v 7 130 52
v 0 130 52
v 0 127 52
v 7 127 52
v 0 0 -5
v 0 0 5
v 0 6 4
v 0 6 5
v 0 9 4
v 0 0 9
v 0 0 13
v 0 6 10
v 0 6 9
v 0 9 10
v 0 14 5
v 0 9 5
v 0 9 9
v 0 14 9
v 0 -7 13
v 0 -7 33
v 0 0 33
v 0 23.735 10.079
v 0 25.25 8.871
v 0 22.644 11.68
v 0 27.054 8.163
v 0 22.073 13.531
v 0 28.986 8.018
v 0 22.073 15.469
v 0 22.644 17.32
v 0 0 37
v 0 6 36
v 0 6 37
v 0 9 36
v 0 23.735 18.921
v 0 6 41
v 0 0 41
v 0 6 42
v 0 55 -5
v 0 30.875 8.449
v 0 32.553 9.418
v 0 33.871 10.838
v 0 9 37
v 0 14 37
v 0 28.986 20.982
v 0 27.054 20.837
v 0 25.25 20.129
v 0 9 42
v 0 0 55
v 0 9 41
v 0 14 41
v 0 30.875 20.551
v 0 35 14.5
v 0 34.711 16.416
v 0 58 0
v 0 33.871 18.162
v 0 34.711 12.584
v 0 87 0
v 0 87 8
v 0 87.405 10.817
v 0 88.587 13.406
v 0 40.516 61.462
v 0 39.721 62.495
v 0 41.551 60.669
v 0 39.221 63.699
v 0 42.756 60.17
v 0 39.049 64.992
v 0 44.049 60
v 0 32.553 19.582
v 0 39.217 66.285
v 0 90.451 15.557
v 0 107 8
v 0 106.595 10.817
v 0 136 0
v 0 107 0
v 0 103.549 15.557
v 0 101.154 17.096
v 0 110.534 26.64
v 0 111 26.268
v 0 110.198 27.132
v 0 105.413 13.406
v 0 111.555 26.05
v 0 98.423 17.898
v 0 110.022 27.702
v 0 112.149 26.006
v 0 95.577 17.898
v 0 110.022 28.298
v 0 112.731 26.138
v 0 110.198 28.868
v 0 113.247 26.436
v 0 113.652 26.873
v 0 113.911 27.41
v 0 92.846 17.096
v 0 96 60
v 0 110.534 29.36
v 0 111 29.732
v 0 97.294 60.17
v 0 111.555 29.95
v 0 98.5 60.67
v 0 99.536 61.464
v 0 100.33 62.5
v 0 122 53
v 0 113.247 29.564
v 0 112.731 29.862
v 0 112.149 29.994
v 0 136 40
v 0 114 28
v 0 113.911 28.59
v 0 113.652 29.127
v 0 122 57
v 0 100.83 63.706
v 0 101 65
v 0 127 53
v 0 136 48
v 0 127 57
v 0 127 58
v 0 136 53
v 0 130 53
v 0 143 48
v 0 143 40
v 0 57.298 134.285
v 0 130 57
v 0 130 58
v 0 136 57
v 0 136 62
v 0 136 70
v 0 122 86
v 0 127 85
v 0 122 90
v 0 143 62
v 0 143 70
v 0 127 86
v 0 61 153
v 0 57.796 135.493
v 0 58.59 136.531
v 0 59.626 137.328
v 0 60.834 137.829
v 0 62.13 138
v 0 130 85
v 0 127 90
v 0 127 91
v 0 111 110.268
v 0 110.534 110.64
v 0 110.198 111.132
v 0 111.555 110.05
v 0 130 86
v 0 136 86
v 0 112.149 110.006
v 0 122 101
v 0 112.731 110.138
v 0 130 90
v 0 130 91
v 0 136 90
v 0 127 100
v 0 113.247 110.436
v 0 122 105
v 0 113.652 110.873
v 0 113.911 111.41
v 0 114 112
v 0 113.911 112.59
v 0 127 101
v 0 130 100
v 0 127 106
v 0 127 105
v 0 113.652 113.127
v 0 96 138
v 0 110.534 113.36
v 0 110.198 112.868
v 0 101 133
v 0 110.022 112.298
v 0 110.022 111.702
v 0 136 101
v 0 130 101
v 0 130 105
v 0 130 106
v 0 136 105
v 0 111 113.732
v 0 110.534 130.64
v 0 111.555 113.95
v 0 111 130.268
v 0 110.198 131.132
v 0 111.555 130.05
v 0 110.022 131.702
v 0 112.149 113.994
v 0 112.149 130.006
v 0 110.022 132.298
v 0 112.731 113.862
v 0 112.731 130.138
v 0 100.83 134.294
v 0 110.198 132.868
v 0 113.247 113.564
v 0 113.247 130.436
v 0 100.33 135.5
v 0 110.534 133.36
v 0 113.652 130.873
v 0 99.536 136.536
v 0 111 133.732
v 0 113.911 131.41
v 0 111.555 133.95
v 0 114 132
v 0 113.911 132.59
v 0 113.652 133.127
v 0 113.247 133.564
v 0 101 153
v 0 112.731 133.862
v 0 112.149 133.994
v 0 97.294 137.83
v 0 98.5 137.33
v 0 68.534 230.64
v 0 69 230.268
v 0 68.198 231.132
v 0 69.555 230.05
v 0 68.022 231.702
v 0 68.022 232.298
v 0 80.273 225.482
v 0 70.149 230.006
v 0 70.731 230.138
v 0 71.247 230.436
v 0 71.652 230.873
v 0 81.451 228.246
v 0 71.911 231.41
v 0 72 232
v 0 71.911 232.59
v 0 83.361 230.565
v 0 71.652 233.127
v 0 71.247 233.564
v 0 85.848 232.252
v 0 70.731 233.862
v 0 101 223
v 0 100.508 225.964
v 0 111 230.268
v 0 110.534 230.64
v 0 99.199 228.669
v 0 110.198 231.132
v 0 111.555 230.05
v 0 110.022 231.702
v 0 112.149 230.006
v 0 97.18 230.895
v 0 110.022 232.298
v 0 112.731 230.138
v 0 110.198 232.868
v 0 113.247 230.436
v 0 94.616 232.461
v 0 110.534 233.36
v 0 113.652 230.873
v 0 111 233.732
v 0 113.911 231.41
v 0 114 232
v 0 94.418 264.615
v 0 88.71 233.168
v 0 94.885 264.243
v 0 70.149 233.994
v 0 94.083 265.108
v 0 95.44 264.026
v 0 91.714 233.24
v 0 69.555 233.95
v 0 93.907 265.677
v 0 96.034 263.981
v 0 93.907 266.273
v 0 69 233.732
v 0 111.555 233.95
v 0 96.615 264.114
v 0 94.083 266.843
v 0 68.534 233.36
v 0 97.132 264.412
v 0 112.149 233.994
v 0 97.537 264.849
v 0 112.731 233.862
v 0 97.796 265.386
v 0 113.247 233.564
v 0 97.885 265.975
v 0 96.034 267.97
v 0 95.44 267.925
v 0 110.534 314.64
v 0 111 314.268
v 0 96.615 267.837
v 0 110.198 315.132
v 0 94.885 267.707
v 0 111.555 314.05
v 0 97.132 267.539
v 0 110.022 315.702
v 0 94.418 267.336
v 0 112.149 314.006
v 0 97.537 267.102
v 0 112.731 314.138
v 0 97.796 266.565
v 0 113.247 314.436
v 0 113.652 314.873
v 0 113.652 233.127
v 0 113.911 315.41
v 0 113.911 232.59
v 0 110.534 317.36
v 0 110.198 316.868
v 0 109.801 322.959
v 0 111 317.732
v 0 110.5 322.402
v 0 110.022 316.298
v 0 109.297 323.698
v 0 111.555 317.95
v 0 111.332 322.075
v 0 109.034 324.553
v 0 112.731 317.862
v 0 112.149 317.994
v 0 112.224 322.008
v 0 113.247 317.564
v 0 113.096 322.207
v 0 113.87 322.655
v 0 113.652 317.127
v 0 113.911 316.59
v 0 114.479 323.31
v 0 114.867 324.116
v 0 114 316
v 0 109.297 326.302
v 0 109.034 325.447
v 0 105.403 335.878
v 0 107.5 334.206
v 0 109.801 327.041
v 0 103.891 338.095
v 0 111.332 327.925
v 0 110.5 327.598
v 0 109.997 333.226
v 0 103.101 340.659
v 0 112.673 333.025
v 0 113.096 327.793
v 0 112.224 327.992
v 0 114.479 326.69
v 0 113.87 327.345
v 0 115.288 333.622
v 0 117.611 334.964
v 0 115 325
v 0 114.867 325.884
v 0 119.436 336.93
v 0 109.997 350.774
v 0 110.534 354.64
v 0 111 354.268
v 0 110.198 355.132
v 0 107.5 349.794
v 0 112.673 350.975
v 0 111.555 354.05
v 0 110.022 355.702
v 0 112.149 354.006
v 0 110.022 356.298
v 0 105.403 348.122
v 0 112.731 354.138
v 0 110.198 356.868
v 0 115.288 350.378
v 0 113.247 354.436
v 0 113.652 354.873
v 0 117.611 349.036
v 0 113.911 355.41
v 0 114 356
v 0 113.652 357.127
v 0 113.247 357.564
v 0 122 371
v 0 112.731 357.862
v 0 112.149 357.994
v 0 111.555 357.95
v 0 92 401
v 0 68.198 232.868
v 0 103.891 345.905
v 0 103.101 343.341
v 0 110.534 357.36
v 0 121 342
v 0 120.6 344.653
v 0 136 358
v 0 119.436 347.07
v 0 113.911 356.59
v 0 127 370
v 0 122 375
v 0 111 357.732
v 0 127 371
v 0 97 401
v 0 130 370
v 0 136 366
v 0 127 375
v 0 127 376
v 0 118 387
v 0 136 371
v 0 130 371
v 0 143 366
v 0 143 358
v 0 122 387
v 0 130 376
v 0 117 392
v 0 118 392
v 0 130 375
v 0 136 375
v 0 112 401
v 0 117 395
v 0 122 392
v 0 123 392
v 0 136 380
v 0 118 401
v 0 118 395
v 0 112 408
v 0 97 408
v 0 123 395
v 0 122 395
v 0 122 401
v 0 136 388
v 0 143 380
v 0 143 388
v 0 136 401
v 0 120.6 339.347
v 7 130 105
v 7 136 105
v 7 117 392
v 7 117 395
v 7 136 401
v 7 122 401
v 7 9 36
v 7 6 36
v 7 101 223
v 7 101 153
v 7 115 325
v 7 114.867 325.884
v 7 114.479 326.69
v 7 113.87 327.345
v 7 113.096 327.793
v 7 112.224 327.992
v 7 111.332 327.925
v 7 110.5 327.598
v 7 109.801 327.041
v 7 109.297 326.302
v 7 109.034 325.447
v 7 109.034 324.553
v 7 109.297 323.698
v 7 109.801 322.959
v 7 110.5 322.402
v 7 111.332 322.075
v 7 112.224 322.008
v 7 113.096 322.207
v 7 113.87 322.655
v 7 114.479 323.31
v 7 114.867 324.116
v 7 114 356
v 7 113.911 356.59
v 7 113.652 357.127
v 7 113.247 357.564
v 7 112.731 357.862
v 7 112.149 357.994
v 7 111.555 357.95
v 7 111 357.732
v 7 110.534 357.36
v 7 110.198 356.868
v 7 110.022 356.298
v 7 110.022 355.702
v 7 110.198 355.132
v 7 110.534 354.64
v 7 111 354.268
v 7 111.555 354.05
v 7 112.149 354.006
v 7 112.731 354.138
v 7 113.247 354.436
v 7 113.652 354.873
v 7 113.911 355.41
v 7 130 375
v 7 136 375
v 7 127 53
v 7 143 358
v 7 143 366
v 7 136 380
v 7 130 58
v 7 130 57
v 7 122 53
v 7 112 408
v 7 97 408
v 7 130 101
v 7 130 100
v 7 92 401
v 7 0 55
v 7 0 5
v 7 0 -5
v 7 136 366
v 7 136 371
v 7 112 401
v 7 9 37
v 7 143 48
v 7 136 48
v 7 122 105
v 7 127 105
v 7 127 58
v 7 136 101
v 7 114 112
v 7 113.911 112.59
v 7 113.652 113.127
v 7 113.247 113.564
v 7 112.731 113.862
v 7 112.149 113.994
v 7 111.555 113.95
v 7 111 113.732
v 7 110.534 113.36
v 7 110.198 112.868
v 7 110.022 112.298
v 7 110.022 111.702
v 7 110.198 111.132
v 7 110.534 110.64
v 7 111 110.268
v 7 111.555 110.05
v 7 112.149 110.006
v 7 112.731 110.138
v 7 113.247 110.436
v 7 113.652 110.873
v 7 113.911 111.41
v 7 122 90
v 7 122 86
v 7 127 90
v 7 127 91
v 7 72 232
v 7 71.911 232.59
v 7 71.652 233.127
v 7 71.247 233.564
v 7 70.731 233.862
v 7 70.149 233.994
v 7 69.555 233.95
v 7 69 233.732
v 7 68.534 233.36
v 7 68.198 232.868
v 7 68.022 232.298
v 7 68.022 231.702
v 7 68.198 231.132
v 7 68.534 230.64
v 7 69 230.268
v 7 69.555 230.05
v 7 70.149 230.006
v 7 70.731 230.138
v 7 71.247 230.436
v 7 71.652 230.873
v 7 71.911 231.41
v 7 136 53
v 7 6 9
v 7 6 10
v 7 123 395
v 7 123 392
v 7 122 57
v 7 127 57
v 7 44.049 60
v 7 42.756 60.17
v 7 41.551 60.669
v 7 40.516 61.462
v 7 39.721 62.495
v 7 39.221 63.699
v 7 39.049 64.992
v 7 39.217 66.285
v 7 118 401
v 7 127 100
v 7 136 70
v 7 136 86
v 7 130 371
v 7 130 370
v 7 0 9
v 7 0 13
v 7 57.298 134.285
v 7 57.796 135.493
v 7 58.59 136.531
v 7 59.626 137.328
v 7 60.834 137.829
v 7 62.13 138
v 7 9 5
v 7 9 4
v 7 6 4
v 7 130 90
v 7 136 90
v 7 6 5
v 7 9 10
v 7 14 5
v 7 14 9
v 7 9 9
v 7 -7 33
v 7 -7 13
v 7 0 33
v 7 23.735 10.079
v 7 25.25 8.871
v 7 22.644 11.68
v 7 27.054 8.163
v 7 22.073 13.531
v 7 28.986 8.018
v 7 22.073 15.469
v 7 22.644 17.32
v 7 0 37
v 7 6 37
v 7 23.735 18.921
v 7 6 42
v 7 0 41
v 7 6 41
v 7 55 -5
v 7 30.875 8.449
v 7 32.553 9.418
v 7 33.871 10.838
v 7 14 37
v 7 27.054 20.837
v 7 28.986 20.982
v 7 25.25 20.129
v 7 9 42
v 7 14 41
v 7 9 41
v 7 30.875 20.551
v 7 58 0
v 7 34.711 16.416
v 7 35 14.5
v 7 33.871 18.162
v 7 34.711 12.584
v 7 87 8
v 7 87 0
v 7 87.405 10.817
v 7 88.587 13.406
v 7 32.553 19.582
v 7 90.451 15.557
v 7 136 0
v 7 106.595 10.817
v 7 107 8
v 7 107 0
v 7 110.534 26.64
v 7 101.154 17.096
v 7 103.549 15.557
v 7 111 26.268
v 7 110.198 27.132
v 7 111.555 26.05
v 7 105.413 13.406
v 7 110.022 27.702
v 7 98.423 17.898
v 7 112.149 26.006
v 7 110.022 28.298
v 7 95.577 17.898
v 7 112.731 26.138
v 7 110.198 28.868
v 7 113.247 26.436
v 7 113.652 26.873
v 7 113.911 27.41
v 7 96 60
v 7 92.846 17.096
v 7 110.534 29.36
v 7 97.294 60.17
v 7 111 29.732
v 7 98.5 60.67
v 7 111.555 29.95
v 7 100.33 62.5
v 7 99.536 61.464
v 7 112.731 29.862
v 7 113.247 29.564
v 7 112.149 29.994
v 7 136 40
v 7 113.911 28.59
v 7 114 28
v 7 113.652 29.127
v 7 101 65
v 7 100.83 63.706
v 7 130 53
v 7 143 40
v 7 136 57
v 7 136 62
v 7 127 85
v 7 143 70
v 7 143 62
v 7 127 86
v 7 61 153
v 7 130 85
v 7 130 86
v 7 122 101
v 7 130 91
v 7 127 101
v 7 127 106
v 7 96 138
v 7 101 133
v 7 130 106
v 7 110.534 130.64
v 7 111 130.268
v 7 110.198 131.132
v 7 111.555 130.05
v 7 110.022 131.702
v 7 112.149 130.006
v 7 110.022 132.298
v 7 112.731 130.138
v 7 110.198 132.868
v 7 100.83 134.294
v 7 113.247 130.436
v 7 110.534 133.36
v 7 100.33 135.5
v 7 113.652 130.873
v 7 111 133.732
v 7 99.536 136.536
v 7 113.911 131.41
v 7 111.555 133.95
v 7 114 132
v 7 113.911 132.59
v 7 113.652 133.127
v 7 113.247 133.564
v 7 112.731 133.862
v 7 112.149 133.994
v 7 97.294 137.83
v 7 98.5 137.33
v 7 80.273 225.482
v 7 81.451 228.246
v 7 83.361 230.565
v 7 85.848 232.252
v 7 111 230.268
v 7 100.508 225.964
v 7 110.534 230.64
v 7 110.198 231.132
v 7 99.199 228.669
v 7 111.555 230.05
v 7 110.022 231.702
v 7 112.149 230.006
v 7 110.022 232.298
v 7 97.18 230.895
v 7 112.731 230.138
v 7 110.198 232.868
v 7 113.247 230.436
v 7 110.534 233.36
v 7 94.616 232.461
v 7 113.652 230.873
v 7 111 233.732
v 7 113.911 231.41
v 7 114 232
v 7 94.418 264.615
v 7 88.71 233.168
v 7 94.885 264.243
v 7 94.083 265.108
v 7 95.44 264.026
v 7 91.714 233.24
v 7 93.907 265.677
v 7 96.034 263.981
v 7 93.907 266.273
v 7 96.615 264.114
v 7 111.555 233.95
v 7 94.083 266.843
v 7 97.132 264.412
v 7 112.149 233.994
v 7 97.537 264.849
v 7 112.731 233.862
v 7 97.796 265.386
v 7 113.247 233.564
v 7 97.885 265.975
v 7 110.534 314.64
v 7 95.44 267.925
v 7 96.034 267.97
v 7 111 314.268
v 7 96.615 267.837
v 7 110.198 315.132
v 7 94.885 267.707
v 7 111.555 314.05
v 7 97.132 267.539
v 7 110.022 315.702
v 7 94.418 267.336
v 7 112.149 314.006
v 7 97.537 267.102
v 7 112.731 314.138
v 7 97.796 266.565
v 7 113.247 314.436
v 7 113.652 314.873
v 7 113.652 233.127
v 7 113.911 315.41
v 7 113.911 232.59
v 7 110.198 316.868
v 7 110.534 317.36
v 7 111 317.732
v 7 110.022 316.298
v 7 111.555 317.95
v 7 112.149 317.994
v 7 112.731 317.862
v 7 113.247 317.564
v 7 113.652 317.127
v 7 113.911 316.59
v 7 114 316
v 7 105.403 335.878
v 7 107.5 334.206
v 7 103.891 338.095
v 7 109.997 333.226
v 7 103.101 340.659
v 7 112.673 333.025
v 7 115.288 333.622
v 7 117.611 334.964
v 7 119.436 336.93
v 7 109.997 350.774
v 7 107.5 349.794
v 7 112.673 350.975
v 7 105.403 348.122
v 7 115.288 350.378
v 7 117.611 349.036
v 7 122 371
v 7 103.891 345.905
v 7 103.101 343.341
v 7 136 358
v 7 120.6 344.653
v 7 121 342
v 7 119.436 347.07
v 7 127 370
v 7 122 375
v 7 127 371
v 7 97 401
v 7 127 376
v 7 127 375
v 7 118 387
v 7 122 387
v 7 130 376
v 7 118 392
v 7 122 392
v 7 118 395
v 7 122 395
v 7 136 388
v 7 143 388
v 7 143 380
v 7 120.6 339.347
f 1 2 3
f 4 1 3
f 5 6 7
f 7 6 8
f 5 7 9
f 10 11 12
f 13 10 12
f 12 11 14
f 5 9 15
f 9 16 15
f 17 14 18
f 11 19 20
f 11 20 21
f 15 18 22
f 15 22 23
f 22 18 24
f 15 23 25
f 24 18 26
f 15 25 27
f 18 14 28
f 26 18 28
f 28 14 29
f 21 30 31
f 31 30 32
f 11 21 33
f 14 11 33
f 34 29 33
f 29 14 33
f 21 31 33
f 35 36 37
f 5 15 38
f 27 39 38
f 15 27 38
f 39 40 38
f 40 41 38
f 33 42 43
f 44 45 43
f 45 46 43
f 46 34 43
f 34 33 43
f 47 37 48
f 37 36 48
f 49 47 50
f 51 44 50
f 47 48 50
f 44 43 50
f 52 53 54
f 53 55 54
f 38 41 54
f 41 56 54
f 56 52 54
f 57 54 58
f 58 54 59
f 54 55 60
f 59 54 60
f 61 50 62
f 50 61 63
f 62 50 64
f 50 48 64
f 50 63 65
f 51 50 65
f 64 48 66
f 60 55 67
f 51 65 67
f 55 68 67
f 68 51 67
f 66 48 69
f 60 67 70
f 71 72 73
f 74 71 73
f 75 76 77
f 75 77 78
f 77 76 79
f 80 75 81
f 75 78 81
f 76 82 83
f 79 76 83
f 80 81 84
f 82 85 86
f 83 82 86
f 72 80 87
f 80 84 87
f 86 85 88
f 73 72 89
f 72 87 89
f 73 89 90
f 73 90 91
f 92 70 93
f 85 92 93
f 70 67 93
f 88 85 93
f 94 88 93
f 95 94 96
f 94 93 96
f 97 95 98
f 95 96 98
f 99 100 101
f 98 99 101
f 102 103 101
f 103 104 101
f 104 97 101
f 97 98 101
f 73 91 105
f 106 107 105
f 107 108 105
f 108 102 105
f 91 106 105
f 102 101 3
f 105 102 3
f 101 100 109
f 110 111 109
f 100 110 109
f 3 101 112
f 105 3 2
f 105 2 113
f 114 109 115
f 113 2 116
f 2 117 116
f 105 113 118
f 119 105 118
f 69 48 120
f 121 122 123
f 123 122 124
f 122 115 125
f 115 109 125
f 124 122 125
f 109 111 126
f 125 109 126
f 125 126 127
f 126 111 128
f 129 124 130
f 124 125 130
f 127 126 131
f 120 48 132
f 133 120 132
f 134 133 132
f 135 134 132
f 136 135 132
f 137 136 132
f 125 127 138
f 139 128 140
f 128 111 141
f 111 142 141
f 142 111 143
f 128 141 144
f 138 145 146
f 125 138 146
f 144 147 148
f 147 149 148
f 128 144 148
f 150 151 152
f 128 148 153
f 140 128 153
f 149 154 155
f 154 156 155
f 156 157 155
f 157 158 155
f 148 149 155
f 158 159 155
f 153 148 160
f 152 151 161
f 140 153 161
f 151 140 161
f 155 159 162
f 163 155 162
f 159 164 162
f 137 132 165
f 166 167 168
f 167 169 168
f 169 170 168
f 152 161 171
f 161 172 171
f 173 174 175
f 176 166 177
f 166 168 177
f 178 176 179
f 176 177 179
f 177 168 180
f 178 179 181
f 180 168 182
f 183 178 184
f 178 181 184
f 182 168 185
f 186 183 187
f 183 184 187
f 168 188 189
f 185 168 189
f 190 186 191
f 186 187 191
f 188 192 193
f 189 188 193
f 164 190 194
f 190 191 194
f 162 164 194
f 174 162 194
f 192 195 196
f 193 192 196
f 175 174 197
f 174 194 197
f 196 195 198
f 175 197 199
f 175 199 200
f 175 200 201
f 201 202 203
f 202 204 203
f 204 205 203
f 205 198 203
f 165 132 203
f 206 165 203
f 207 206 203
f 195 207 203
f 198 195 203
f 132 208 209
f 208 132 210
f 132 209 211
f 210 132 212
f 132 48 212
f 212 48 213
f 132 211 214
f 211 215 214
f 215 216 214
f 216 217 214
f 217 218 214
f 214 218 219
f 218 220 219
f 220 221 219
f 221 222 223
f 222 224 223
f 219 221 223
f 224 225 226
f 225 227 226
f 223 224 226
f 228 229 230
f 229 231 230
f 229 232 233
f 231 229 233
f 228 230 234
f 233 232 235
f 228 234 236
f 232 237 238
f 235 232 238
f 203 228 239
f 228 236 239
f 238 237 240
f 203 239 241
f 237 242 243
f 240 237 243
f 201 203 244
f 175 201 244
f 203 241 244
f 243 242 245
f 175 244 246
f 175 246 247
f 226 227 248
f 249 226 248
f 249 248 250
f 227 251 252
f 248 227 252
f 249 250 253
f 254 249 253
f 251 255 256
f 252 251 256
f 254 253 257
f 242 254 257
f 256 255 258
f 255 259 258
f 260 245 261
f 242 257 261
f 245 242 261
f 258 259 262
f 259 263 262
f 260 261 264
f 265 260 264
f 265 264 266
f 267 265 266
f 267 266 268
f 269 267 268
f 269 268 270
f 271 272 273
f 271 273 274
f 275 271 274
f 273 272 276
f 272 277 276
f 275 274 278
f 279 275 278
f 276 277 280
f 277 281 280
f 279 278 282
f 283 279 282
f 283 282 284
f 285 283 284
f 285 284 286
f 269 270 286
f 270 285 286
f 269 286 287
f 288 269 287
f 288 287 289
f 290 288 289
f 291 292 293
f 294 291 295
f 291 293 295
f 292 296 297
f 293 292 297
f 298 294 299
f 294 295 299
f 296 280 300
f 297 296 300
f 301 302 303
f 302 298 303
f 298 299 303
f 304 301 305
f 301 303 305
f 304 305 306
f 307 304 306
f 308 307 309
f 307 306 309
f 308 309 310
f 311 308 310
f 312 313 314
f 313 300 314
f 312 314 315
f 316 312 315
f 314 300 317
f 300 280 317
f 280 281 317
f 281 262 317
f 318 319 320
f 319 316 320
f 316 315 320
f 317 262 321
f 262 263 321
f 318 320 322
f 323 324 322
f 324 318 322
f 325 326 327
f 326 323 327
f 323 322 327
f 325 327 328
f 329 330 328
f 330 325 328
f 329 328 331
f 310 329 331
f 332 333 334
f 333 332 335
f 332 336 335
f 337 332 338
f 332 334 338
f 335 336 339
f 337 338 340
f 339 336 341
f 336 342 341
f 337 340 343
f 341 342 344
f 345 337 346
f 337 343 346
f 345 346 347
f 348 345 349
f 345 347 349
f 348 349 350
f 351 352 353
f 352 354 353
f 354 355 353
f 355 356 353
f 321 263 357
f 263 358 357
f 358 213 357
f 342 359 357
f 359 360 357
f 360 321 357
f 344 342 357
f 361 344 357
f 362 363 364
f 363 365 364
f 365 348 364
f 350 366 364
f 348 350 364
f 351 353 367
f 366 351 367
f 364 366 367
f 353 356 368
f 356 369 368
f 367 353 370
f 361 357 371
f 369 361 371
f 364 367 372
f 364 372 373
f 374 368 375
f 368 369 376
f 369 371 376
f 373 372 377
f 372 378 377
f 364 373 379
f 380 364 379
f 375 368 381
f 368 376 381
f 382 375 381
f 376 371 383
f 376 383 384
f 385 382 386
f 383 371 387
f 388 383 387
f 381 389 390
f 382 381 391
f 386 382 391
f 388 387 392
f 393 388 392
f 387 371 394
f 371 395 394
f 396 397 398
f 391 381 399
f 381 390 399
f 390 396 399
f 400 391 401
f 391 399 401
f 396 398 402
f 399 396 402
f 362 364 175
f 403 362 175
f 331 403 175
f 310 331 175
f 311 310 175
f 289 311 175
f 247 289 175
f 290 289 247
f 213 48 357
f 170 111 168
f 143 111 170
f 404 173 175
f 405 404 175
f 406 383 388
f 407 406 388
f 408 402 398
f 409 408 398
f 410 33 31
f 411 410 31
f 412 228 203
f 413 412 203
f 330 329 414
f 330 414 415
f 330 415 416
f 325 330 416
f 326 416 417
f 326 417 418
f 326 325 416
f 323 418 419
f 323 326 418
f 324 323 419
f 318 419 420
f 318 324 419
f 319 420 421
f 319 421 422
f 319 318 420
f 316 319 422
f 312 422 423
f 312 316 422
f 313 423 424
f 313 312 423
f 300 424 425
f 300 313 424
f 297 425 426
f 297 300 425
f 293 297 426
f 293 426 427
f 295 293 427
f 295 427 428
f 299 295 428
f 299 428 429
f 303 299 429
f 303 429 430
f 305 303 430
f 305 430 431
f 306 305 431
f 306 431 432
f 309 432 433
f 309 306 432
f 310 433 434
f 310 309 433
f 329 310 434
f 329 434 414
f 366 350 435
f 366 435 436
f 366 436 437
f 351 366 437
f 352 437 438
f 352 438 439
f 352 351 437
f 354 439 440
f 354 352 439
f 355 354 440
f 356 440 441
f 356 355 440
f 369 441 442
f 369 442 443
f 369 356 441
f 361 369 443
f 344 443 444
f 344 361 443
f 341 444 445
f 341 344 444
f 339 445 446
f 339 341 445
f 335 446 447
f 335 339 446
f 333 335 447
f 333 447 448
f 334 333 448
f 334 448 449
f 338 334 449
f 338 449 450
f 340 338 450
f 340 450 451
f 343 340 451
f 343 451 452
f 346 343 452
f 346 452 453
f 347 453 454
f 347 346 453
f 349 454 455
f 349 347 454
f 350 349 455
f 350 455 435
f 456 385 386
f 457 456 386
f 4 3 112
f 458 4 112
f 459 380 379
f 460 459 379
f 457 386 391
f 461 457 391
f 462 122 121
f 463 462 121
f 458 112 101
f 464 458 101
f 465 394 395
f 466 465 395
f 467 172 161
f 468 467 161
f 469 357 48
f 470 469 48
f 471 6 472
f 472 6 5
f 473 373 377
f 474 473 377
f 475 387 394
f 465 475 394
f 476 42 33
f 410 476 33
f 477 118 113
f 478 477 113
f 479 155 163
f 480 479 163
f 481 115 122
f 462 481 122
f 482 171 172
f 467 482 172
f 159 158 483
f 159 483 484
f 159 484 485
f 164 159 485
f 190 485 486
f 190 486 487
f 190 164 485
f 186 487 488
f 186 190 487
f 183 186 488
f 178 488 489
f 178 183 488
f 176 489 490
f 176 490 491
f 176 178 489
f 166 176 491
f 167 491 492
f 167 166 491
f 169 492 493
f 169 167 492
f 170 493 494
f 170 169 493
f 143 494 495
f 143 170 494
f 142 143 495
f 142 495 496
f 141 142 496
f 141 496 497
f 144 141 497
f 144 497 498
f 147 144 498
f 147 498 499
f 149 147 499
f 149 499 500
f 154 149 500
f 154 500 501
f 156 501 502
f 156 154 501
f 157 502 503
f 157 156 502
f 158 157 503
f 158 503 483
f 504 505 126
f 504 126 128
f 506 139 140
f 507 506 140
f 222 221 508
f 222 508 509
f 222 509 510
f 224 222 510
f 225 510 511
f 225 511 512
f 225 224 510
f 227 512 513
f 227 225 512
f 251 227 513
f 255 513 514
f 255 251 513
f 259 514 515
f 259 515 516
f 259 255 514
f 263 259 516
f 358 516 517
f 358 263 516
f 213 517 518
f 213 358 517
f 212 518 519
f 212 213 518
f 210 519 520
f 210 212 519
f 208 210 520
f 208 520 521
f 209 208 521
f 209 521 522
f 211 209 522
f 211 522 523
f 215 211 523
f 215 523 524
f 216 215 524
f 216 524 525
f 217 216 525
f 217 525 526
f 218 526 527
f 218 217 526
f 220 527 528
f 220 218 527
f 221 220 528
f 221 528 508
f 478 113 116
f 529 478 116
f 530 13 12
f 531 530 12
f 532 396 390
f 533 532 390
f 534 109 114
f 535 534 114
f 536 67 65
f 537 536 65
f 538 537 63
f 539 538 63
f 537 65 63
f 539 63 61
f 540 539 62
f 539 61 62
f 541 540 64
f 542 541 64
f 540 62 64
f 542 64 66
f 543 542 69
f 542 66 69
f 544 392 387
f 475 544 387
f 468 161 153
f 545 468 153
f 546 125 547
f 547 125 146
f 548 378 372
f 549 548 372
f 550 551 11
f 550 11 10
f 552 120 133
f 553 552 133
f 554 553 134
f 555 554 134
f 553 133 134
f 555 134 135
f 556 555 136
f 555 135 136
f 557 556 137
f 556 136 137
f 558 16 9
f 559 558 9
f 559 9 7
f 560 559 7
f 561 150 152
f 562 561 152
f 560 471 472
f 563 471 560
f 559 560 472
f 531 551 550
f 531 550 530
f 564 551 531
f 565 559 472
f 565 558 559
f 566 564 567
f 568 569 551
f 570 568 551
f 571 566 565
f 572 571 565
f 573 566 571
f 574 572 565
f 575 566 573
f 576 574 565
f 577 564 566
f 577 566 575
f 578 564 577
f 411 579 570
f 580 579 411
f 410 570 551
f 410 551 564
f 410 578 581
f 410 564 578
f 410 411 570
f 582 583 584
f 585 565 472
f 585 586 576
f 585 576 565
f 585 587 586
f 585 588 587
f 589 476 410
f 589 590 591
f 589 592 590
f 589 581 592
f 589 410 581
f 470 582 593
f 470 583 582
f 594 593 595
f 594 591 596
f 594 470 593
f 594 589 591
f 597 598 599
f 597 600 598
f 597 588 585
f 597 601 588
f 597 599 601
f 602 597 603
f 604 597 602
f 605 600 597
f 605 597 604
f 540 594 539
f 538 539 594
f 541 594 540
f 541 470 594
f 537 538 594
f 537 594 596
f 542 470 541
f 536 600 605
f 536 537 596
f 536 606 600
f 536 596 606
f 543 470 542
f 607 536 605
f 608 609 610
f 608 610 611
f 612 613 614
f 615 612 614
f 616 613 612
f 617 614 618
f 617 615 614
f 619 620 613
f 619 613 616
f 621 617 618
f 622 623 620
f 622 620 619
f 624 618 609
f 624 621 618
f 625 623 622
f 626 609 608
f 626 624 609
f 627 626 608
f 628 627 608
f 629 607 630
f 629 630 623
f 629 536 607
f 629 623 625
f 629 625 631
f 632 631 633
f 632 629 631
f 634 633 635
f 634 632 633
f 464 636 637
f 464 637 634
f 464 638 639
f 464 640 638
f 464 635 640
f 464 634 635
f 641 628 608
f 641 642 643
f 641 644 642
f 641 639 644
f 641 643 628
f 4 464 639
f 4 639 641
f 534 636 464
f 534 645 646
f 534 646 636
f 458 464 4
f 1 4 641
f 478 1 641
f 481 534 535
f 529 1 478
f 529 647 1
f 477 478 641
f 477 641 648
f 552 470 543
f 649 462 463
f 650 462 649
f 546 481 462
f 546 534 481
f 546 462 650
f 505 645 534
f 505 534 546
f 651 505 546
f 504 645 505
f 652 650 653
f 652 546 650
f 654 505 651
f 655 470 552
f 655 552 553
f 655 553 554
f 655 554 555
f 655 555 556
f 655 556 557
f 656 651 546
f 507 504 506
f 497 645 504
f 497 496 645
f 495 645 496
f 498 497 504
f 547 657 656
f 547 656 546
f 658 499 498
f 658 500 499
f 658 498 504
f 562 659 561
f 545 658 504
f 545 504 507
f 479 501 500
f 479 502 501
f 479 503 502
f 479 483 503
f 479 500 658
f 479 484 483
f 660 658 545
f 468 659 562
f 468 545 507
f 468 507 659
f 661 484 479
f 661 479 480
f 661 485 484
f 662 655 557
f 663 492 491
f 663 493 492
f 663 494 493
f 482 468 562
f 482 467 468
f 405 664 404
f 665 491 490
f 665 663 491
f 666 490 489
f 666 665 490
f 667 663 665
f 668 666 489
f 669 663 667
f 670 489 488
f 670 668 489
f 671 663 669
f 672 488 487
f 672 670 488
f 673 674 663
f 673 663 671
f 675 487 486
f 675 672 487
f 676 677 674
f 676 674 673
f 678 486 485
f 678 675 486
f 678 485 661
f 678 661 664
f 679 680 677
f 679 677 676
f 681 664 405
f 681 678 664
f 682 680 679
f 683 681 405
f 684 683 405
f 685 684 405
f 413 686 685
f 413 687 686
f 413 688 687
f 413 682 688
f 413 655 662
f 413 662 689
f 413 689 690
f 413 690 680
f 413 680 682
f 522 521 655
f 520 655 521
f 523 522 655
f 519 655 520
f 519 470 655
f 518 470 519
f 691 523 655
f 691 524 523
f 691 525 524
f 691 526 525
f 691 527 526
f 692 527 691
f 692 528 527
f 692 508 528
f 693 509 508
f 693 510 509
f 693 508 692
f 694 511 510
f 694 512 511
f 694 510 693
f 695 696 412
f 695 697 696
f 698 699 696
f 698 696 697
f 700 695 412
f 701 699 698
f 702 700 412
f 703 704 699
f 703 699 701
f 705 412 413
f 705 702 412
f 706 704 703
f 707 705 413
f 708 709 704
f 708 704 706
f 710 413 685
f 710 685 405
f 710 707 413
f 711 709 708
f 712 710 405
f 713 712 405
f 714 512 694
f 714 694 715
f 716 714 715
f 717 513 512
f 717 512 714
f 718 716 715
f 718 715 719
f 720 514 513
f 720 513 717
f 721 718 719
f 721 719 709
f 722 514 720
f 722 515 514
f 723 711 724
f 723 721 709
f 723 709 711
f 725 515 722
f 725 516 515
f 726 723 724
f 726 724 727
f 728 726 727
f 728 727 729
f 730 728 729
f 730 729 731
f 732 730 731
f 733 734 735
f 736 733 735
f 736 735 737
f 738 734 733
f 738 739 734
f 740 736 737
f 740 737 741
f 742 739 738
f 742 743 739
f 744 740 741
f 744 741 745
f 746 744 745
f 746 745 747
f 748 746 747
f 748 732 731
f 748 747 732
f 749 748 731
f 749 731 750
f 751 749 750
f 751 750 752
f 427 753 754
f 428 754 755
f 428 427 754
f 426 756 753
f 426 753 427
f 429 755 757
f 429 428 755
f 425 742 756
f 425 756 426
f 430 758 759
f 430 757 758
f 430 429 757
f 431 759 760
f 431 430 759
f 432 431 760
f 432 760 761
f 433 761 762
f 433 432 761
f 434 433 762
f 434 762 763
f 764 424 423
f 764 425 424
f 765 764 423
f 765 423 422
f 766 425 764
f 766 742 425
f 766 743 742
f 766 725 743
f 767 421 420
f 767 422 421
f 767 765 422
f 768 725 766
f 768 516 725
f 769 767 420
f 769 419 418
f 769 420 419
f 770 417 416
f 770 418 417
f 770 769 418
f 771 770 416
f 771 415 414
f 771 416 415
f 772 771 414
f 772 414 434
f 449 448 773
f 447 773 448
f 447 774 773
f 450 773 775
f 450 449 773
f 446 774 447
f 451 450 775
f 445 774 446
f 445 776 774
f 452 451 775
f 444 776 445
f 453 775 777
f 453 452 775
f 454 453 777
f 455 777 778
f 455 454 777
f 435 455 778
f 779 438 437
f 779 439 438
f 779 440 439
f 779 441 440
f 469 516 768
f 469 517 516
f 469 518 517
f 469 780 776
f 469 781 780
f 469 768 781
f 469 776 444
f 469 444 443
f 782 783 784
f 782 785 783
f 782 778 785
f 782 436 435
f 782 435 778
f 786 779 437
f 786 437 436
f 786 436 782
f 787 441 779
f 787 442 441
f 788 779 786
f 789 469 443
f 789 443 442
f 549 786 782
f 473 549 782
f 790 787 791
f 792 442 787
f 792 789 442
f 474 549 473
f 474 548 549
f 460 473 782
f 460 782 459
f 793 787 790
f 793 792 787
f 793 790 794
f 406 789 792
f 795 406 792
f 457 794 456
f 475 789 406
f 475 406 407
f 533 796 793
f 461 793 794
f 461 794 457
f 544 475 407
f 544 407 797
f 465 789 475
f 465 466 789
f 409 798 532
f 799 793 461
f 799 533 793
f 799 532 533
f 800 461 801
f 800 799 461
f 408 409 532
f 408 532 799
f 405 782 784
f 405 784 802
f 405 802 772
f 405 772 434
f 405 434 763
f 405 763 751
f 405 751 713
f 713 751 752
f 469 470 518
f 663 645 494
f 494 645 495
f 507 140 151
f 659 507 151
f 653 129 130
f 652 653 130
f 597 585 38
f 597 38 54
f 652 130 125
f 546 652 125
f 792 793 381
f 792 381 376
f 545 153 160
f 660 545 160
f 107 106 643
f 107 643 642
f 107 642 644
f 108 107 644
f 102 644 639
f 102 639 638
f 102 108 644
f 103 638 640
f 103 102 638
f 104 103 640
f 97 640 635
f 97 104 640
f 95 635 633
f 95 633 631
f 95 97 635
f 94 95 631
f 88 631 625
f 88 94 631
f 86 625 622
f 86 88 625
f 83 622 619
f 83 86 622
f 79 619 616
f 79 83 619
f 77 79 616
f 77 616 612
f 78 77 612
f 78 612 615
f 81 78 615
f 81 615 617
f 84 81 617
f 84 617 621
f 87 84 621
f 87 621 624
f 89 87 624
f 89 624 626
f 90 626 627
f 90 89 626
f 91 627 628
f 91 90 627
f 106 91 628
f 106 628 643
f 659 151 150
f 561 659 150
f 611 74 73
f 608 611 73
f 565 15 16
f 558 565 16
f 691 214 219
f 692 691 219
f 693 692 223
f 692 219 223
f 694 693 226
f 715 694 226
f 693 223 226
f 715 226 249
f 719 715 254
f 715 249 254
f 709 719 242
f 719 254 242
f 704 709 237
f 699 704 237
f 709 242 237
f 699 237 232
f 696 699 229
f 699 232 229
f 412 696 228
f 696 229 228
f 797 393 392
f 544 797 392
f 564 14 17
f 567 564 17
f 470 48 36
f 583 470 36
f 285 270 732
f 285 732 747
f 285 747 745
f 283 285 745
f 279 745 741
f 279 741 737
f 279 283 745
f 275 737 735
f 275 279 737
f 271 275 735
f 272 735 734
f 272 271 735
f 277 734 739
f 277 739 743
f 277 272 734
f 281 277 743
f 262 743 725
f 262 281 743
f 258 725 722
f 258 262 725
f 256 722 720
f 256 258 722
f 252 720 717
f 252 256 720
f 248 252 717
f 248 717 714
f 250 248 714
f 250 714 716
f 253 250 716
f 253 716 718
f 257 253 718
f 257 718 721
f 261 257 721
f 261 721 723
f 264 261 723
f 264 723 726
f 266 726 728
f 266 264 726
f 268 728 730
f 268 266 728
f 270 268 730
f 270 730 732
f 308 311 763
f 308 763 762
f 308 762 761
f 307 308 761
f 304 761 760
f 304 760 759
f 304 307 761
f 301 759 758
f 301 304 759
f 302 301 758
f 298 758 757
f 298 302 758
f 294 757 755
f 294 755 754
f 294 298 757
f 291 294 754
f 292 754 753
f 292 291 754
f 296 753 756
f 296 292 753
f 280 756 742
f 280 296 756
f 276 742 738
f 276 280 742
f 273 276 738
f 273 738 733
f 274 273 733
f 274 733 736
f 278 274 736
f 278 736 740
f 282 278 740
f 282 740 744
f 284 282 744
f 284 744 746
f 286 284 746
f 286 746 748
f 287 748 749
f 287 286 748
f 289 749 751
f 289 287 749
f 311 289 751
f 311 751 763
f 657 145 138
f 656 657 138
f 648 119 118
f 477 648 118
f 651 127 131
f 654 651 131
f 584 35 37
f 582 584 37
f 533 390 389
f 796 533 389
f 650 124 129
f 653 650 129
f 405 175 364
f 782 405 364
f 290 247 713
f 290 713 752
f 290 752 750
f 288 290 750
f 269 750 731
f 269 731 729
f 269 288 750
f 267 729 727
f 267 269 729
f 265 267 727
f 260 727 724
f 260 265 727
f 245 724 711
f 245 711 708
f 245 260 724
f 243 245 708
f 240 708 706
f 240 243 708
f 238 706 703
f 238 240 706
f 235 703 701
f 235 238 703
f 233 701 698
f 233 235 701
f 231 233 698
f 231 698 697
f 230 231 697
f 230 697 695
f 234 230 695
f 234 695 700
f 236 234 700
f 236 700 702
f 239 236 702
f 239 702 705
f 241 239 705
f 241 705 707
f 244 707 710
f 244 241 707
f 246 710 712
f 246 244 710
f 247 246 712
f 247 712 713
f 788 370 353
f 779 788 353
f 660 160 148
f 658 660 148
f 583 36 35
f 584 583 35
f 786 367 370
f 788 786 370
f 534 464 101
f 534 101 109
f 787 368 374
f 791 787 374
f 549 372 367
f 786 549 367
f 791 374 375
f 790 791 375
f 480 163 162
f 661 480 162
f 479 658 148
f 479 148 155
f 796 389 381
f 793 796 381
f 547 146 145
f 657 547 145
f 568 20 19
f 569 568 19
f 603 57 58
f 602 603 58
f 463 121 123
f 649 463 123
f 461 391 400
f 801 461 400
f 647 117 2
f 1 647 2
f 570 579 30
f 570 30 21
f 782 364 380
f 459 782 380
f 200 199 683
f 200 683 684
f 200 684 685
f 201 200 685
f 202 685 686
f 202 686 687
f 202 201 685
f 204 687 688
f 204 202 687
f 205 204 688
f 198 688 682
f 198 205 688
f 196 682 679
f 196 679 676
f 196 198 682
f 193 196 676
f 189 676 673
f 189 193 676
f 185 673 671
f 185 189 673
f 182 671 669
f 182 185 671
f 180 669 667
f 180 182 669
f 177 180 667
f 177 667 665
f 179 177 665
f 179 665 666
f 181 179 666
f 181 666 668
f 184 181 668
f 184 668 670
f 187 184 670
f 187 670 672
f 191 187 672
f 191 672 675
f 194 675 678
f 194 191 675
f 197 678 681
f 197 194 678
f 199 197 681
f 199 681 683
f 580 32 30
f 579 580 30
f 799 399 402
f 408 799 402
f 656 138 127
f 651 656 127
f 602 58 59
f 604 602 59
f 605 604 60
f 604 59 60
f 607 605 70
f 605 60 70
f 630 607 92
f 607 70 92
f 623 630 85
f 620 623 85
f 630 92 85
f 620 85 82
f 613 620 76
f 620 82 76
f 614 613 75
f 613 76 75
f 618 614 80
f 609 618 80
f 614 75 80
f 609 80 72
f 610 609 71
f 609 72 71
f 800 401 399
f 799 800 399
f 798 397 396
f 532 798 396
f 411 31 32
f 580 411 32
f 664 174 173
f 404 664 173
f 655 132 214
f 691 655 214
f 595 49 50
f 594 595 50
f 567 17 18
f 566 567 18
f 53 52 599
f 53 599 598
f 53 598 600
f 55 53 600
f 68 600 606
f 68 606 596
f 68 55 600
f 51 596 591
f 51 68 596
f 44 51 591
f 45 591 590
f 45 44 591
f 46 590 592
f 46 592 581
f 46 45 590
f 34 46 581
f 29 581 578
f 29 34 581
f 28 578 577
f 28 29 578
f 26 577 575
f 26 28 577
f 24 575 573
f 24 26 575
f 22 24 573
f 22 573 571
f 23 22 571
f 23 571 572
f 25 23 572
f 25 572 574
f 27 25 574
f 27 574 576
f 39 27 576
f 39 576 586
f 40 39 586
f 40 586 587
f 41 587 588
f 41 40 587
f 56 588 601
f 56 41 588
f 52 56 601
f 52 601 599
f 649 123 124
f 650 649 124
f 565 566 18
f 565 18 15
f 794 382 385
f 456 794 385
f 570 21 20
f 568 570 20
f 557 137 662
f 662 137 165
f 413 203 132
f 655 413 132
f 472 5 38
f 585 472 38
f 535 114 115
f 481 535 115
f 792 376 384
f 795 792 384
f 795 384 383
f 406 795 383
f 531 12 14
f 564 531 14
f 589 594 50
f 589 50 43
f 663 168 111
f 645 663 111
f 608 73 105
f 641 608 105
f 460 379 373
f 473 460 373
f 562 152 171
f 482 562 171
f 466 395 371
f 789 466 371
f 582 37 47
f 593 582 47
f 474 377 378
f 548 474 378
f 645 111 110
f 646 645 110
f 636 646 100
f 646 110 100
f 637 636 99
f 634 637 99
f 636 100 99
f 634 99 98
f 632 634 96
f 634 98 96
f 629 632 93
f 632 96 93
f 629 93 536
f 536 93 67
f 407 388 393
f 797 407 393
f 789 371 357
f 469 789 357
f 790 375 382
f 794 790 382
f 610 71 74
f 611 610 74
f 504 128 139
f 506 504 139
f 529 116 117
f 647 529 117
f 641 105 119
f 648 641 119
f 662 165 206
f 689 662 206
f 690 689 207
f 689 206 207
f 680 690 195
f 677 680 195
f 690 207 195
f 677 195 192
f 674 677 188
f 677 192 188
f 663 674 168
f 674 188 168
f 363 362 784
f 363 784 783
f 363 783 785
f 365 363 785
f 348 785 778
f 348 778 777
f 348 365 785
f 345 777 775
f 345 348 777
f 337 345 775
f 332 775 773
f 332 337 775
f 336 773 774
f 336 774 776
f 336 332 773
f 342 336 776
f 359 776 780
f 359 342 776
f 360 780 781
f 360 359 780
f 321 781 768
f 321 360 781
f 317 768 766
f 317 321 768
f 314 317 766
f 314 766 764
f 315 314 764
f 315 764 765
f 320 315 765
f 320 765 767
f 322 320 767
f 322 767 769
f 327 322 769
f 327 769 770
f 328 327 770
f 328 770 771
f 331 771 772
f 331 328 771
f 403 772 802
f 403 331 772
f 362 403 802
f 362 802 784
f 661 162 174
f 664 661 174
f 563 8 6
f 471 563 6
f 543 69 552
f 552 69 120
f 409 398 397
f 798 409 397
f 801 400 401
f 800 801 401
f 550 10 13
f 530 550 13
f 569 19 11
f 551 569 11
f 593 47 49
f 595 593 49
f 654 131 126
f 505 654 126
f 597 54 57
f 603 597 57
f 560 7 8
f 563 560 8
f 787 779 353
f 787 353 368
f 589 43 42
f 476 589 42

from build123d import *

# Parameters (mm, degrees)
F0_R     = 6.5
F0_R_2   = 2
F0_R_3   = 3
F0_R_4   = 9
F1_DEPTH = 7


with BuildPart() as f1:
    # F0 (on Right) → F1 (new body)
    with BuildSketch(Plane.YZ):
        with BuildLine():
            Line((55, -5), (58, 0))
            Line((58, 0), (87, 0))
            Line((87, 0), (87, 8))
            ThreePointArc((87, 8), (97, 18), (107, 8))
            Line((107, 8), (107, 0))
            Line((107, 0), (136, 0))
            Line((136, 0), (136, 40))
            Line((136, 40), (143, 40))
            Line((143, 40), (143, 48))
            Line((143, 48), (136, 48))
            Line((136, 48), (136, 53))
            Line((136, 53), (130, 53))
            Line((130, 53), (130, 52))
            Line((130, 52), (127, 52))
            Line((127, 52), (127, 53))
            Line((127, 53), (122, 53))
            Line((122, 53), (122, 55))
            Line((122, 55), (122, 57))
            Line((122, 57), (127, 57))
            Line((127, 57), (127, 58))
            Line((127, 58), (130, 58))
            Line((130, 58), (130, 57))
            Line((130, 57), (136, 57))
            Line((136, 57), (136, 62))
            Line((136, 62), (143, 62))
            Line((143, 62), (143, 70))
            Line((143, 70), (136, 70))
            Line((136, 70), (136, 86))
            Line((136, 86), (130, 86))
            Line((130, 86), (130, 85))
            Line((130, 85), (127, 85))
            Line((127, 85), (127, 86))
            Line((127, 86), (122, 86))
            Line((122, 86), (122, 88))
            Line((122, 88), (122, 90))
            Line((122, 90), (127, 90))
            Line((127, 90), (127, 91))
            Line((127, 91), (130, 91))
            Line((130, 91), (130, 90))
            Line((130, 90), (136, 90))
            Line((136, 90), (136, 101))
            Line((136, 101), (130, 101))
            Line((130, 101), (130, 100))
            Line((130, 100), (127, 100))
            Line((127, 100), (127, 101))
            Line((127, 101), (122, 101))
            Line((122, 101), (122, 103))
            Line((122, 103), (122, 105))
            Line((122, 105), (127, 105))
            Line((127, 105), (127, 106))
            Line((127, 106), (130, 106))
            Line((130, 106), (130, 105))
            Line((130, 105), (136, 105))
            Line((136, 105), (136, 358))
            Line((136, 358), (143, 358))
            Line((143, 358), (143, 366))
            Line((143, 366), (136, 366))
            Line((136, 366), (136, 371))
            Line((136, 371), (130, 371))
            Line((130, 371), (130, 370))
            Line((130, 370), (127, 370))
            Line((127, 370), (127, 371))
            Line((127, 371), (122, 371))
            Line((122, 371), (122, 373))
            Line((122, 373), (122, 375))
            Line((122, 375), (127, 375))
            Line((127, 375), (127, 376))
            Line((127, 376), (130, 376))
            Line((130, 376), (130, 375))
            Line((130, 375), (136, 375))
            Line((136, 375), (136, 380))
            Line((136, 380), (143, 380))
            Line((143, 380), (143, 388))
            Line((143, 388), (136, 388))
            Line((136, 388), (136, 401))
            Line((136, 401), (122, 401))
            Line((122, 401), (122, 395))
            Line((122, 395), (123, 395))
            Line((123, 395), (123, 392))
            Line((123, 392), (122, 392))
            Line((122, 392), (122, 387))
            Line((122, 387), (120, 387))
            Line((120, 387), (118, 387))
            Line((118, 387), (118, 392))
            Line((118, 392), (117, 392))
            Line((117, 392), (117, 395))
            Line((117, 395), (118, 395))
            Line((118, 395), (118, 401))
            Line((118, 401), (112, 401))
            Line((112, 401), (112, 408))
            Line((112, 408), (97, 408))
            Line((97, 408), (97, 401))
            Line((97, 401), (92, 401))
            Line((92, 401), (0, 55))
            Line((0, 55), (0, 41))
            Line((0, 41), (6, 41))
            Line((6, 41), (6, 42))
            Line((6, 42), (9, 42))
            Line((9, 42), (9, 41))
            Line((9, 41), (14, 41))
            Line((14, 41), (14, 39))
            Line((14, 39), (14, 37))
            Line((14, 37), (9, 37))
            Line((9, 37), (9, 36))
            Line((9, 36), (6, 36))
            Line((6, 36), (6, 37))
            Line((6, 37), (0, 37))
            Line((0, 37), (0, 33))
            Line((0, 33), (-7, 33))
            Line((-7, 33), (-7, 23))
            Line((-7, 23), (-7, 13))
            Line((-7, 13), (0, 13))
            Line((0, 13), (0, 9))
            Line((0, 9), (6, 9))
            Line((6, 9), (6, 10))
            Line((6, 10), (9, 10))
            Line((9, 10), (9, 9))
            Line((9, 9), (14, 9))
            Line((14, 9), (14, 7))
            Line((14, 7), (14, 5))
            Line((14, 5), (9, 5))
            Line((9, 5), (9, 4))
            Line((9, 4), (6, 4))
            Line((6, 4), (6, 5))
            Line((6, 5), (0, 5))
            Line((0, 5), (0, 0))
            Line((0, 0), (0, -5))
            Line((0, -5), (55, -5))
        make_face()
        with Locations((28.5, 14.5)):
            Circle(F0_R, mode=Mode.SUBTRACT)
        with Locations((112, 28)):
            Circle(F0_R_2, mode=Mode.SUBTRACT)
        with BuildLine():
            ThreePointArc((57.29765, 134.284836), (59.082144, 136.963848), (62.129751, 138))
            Line((62.129751, 138), (96, 138))
            ThreePointArc((96, 138), (99.535534, 136.535534), (101, 133))
            Line((101, 133), (101, 65))
            ThreePointArc((101, 65), (99.535534, 61.464466), (96, 60))
            Line((96, 60), (44.048826, 60))
            ThreePointArc((44.048826, 60), (40.084978, 61.952393), (39.216725, 66.284836))
            Line((39.216725, 66.284836), (57.29765, 134.284836))
        make_face(mode=Mode.SUBTRACT)
        with BuildLine():
            Line((101, 223), (101, 153))
            Line((101, 153), (61, 153))
            Line((61, 153), (80.27254, 225.481509))
            ThreePointArc((80.27254, 225.481509), (91.713641, 233.239781), (101, 223))
        make_face(mode=Mode.SUBTRACT)
        with Locations((112, 112)):
            Circle(F0_R_2, mode=Mode.SUBTRACT)
        with Locations((112, 132)):
            Circle(F0_R_2, mode=Mode.SUBTRACT)
        with Locations((70, 232)):
            Circle(F0_R_2, mode=Mode.SUBTRACT)
        with Locations((95.884576, 265.975365)):
            Circle(F0_R_2, mode=Mode.SUBTRACT)
        with Locations((112, 232)):
            Circle(F0_R_2, mode=Mode.SUBTRACT)
        with Locations((112, 316)):
            Circle(F0_R_2, mode=Mode.SUBTRACT)
        with Locations((112, 325)):
            Circle(F0_R_3, mode=Mode.SUBTRACT)
        with Locations((112, 342)):
            Circle(F0_R_4, mode=Mode.SUBTRACT)
        with Locations((112, 356)):
            Circle(F0_R_2, mode=Mode.SUBTRACT)
    extrude(amount=F1_DEPTH)


solid = f1.part
